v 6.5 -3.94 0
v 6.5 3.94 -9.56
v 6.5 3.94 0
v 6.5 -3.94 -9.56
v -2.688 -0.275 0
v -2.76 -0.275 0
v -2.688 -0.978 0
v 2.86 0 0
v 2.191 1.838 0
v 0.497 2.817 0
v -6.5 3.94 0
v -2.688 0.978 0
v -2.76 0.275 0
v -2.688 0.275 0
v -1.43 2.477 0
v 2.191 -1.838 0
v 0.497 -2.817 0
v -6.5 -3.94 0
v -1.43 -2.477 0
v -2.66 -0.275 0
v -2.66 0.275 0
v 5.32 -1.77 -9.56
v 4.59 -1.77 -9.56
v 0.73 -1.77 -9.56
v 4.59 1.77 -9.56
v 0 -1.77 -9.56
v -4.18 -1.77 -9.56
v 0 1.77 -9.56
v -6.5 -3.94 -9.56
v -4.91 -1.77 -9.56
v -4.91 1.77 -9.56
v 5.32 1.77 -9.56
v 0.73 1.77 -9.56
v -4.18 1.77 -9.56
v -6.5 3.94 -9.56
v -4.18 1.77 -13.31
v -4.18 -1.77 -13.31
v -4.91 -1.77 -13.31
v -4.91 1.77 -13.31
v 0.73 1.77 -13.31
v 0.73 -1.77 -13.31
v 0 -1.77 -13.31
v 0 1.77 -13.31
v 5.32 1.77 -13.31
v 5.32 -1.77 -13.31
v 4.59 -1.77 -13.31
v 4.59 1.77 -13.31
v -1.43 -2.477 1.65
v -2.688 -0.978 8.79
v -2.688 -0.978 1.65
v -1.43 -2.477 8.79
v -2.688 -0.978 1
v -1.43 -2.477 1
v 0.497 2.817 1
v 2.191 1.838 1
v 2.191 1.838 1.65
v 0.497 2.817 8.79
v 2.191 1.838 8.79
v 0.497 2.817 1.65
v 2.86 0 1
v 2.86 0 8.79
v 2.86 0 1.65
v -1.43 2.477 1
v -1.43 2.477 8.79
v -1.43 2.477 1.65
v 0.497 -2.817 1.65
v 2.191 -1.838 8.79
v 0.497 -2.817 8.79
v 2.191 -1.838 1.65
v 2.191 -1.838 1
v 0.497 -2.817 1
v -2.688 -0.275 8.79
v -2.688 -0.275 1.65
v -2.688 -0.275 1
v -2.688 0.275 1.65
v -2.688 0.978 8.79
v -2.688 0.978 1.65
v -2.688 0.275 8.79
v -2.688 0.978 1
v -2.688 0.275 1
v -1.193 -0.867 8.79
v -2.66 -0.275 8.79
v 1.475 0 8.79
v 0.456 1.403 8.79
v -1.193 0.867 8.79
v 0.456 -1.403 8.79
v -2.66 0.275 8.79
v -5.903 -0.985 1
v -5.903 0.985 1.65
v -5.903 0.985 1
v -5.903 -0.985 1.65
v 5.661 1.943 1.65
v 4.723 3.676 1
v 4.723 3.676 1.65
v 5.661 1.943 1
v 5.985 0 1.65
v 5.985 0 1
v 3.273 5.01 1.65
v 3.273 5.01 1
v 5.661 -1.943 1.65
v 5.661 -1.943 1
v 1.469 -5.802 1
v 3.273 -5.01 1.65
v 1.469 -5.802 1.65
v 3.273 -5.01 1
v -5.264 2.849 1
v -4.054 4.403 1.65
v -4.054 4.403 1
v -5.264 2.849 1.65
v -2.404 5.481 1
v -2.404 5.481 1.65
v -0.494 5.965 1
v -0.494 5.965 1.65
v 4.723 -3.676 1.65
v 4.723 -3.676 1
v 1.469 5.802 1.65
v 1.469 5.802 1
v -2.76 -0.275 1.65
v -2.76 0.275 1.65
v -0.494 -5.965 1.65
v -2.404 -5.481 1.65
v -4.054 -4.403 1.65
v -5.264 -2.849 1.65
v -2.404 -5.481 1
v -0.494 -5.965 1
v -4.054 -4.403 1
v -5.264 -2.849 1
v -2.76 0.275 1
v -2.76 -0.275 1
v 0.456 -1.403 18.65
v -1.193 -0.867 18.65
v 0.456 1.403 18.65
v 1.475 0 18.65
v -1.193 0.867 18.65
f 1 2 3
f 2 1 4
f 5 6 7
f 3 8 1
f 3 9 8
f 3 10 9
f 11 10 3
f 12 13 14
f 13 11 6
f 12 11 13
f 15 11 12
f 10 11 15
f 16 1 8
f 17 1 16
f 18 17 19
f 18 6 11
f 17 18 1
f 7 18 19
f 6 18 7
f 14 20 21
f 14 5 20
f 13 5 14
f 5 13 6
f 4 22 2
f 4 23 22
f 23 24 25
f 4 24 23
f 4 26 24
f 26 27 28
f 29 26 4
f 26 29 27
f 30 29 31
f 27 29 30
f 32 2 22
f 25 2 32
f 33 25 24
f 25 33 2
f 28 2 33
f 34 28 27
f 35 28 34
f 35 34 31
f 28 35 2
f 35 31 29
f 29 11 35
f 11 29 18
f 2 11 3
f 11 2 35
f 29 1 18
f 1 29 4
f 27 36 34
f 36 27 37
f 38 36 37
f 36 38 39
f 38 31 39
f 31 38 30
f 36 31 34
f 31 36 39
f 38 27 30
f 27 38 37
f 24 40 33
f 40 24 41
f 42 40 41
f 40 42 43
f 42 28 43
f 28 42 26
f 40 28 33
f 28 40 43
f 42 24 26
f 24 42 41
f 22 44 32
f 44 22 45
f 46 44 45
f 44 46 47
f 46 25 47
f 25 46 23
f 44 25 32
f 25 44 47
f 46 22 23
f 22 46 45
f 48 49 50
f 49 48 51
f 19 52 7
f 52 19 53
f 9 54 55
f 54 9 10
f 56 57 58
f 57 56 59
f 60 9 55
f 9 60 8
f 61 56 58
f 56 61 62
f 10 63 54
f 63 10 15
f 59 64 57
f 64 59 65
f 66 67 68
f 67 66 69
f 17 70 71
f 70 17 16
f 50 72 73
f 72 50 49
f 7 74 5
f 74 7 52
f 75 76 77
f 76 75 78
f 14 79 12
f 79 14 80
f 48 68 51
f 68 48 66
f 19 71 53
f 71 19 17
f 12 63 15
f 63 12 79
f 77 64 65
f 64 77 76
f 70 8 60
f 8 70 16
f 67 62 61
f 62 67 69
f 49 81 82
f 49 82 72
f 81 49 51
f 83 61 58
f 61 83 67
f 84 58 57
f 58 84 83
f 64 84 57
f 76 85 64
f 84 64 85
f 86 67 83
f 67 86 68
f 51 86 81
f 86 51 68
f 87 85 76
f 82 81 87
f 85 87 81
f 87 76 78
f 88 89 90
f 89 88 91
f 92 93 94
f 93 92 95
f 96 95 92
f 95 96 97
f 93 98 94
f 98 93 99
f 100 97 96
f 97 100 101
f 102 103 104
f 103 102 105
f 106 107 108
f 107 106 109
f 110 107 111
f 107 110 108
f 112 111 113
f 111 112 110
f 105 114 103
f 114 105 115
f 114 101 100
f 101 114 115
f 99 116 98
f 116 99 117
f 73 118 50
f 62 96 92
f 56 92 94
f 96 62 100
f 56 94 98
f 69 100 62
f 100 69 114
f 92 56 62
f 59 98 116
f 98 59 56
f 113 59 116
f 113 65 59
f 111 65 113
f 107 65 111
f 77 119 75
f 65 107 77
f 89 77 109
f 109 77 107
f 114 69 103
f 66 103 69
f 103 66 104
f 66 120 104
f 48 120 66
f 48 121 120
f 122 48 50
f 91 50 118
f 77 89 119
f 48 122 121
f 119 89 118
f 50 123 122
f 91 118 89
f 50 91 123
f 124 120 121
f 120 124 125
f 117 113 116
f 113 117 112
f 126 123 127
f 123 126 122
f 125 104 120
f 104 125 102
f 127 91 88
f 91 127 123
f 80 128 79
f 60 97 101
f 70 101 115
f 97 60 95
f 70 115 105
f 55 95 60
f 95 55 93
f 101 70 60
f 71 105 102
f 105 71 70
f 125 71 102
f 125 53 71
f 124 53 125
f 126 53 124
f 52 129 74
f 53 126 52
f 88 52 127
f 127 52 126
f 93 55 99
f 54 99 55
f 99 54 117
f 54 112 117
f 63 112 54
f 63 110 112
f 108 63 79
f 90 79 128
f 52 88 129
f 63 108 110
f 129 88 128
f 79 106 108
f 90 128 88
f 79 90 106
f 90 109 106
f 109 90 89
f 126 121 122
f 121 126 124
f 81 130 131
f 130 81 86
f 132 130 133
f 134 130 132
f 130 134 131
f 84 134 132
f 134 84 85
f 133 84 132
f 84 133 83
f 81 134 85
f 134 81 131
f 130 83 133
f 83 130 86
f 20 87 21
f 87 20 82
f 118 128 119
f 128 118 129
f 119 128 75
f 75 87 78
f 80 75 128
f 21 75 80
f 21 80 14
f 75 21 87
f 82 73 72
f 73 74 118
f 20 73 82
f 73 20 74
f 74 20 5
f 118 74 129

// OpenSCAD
//
// Model for a SPDT switch from AdaFruit (Product ID 3221)
//
// The switch module can be used for checking for interferance.
// The cutout module is to be used for making a hole for mounting the switch in a panel.
//

module bbs_spdt_switch()
{
    translate([-13/2, -7.88/2, -9.56]) difference()
    {
        union()
        {
            cube([13, 7.88, 9.56]);
            translate([1.59, 2.17, -3.75]) cube([0.73, 7.88-2.17*2, 3.75]);
            translate([6.5, 2.17, -3.75]) cube([0.73, 7.88-2.17*2, 3.75]);
            translate([11.09, 2.17, -3.75]) cube([0.73, 7.88-2.17*2, 3.75]);
            translate([13/2, 7.88/2, 9.56]) cylinder(h=8.79, r=5.72/2);
            translate([13/2, 7.88/2, 9.56 + 1]) cylinder(h=0.65, r=11.97/2);
            translate([13/2, 7.88/2, 9.56+8.79]) cylinder(h=9.86, r=2.95/2);
        }
        union()
        {
            translate([13.2/2-5.72/2, 7.88/2-0.55/2, 9.56]) cube([0.1, .55, 8.79]);
        }
    }
}

module bbs_spdt_switch_cutout()
{
    difference()
    {
        translate([0, 0, -1.0]) cylinder(h=34.0, r=5.75/2, $fn=20);
        translate([-5.75/2, -0.55/2, -2.0]) cube([0.1, 0.55/2, 5.0]);
    }
}

bbs_spdt_switch();
//bbs_spdt_switch_cutout();
